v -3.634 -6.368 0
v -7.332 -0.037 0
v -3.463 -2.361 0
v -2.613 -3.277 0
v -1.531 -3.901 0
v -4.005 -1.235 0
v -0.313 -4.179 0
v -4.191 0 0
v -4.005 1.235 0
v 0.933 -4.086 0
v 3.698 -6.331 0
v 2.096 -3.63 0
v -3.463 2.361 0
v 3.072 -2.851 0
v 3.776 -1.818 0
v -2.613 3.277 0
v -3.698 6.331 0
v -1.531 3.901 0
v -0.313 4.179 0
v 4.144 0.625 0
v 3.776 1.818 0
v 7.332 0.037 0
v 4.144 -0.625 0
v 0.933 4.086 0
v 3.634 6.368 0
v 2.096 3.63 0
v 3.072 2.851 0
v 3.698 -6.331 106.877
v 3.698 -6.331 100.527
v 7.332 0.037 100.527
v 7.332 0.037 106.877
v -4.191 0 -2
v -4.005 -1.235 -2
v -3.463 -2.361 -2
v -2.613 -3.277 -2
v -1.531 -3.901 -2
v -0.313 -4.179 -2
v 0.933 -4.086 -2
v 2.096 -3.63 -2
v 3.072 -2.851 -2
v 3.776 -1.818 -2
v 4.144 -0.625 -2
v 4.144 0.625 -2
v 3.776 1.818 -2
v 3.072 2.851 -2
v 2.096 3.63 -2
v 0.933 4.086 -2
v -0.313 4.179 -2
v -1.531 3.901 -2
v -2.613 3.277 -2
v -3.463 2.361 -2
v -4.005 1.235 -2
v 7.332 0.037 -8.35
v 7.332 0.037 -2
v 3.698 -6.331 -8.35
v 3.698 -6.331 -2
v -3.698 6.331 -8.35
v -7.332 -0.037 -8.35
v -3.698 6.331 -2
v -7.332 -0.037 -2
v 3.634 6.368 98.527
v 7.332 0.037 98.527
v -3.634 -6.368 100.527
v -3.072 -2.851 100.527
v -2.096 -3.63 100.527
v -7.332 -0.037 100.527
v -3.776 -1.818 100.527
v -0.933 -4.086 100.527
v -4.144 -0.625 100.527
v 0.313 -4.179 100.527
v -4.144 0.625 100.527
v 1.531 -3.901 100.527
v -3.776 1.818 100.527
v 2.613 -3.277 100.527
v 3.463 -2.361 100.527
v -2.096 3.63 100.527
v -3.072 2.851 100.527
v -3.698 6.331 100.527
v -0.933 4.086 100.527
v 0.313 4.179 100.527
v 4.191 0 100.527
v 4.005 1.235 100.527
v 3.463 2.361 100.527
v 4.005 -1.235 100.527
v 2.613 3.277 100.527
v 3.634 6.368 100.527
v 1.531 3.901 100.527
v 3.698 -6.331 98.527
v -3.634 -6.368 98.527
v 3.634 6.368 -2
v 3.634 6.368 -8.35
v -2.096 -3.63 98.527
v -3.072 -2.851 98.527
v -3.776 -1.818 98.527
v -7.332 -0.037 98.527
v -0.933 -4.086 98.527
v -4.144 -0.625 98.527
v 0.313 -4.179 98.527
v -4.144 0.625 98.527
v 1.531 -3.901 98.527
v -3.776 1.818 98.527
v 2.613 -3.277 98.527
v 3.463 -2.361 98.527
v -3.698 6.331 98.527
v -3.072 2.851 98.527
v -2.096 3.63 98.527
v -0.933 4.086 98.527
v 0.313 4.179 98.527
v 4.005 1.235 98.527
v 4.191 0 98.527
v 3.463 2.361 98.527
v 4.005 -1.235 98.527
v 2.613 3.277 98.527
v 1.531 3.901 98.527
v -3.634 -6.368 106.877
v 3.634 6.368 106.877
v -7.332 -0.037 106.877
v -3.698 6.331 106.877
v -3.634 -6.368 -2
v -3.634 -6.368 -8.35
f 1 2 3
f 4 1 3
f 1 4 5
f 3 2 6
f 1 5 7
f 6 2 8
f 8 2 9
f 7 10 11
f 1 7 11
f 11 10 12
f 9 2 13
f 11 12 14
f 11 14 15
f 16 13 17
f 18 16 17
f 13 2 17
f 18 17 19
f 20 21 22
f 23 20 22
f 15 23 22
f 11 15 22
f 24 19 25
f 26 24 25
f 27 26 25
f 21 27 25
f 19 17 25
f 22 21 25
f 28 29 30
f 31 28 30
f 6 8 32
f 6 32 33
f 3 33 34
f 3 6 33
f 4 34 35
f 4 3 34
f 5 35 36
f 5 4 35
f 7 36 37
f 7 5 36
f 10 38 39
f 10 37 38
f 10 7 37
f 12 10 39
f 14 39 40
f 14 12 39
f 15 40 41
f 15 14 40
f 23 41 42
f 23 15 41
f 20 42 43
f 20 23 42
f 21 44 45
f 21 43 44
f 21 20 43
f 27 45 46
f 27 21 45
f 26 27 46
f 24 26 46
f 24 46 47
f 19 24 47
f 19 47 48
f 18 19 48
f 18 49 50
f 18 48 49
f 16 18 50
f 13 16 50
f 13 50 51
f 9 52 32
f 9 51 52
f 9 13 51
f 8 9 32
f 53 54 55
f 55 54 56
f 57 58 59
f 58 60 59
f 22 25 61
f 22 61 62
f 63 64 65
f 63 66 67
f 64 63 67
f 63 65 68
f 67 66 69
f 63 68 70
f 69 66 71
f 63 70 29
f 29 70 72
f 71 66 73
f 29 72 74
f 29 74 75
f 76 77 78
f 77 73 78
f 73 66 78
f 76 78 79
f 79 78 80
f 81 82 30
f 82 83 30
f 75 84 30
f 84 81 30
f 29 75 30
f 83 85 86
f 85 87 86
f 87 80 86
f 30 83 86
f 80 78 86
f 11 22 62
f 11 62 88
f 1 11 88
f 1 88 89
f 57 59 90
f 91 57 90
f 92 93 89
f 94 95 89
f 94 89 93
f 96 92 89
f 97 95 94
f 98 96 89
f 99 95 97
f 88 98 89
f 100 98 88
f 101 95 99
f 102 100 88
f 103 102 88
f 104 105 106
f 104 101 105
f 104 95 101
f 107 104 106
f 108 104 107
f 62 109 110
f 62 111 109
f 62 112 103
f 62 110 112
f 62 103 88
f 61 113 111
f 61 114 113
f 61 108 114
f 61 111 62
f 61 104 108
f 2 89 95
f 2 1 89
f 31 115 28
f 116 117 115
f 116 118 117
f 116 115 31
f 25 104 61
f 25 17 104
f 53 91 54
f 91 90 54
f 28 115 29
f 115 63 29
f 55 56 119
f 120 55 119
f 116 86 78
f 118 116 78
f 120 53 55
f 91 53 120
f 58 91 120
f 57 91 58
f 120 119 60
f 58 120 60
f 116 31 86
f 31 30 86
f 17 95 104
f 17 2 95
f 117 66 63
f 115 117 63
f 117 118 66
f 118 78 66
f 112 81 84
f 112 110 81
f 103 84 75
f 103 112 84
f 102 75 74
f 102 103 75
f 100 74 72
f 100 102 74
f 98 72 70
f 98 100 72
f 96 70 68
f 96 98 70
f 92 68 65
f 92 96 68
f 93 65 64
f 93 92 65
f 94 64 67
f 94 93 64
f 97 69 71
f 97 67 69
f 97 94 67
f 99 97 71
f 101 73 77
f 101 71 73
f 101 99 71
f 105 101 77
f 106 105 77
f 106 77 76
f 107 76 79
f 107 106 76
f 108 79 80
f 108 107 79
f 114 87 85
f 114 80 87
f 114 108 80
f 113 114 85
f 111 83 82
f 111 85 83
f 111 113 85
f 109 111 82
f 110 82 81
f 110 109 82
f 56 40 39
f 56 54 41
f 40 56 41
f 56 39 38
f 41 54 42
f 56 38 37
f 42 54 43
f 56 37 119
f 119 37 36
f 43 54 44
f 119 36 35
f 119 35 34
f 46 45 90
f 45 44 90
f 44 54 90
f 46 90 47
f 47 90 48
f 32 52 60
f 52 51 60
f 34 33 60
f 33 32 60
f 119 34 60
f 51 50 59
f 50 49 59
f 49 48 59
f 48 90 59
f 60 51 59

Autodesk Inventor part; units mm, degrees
ref_plane "YZ Plane" through (0, 0, 0) normal (1, 0, 0) x (0, 1, 0)
ref_plane "XZ Plane" through (0, 0, 0) normal (0, 1, 0) x (-1, 0, 0)
ref_plane "XY Plane" through (0, 0, 0) normal (0, 0, 1) x (1, 0, 0)
sketch "Sketch1" plane through (0, 0, 0) normal (0, 0, 1) x (1, 0, 0)
  line L0 (3.634, 6.3685) -> (7.3323, 0.0371)
  line L1 (7.3323, 0.0371) -> (3.6983, -6.3314)
  line L2 (3.6983, -6.3314) -> (-3.634, -6.3685)
  line L3 (-3.634, -6.3685) -> (-7.3323, -0.0371)
  line L4 (-7.3323, -0.0371) -> (-3.6983, 6.3314)
  line L5 (-3.6983, 6.3314) -> (3.634, 6.3685)
  point P0 (0, 0)
  point P1 (0, 0)
  dimension "d0" = 12.7
extrude "Extrusion1" add sketch "Sketch1" along normal blind 98.5266
sketch "Sketch2" plane through (0, 0, 98.5266) normal (0, 0, 1) x (1, 0, 0)
  circle A0 centre (0, 0) radius 4.191
  dimension "d3" = 8.382
extrude "Extrusion2" add sketch "Sketch2" along normal blind 2
sketch "Sketch3" plane through (0, 0, 0) normal (0, 0, -1) x (-1, 0, 0)
  circle A0 centre (0, 0) radius 4.191
  dimension "d6" = 8.382
extrude "Extrusion3" add sketch "Sketch3" along normal blind 2
sketch "Sketch4" plane through (0, 0, 100.5266) normal (0, 0, 1) x (1, 0, 0)
  circle A0 centre (0, 0) radius 4.191 construction
  line L0 (7.3323, 0.0371) -> (3.634, 6.3685) projected
  line L1 (3.634, 6.3685) -> (-3.6983, 6.3314) projected
  line L2 (-3.6983, 6.3314) -> (-7.3323, -0.0371) projected
  line L3 (-7.3323, -0.0371) -> (-3.634, -6.3685) projected
  line L4 (-3.634, -6.3685) -> (3.6983, -6.3314) projected
  line L5 (3.6983, -6.3314) -> (7.3323, 0.0371) projected
extrude "Extrusion4" add sketch "Sketch4" along normal blind 6.35
sketch "Sketch5" plane through (0, 0, -2) normal (0, 0, -1) x (-1, 0, 0)
  circle A0 centre (0, 0) radius 4.191 construction
  line L0 (-3.634, 6.3685) -> (-7.3323, 0.0371) projected
  line L1 (-7.3323, 0.0371) -> (-3.6983, -6.3314) projected
  line L2 (-3.6983, -6.3314) -> (3.634, -6.3685) projected
  line L3 (3.634, -6.3685) -> (7.3323, -0.0371) projected
  line L4 (7.3323, -0.0371) -> (3.6983, 6.3314) projected
  line L5 (3.6983, 6.3314) -> (-3.634, 6.3685) projected
extrude "Extrusion5" add sketch "Sketch5" along normal blind 6.35
properties part number "Shafts"
